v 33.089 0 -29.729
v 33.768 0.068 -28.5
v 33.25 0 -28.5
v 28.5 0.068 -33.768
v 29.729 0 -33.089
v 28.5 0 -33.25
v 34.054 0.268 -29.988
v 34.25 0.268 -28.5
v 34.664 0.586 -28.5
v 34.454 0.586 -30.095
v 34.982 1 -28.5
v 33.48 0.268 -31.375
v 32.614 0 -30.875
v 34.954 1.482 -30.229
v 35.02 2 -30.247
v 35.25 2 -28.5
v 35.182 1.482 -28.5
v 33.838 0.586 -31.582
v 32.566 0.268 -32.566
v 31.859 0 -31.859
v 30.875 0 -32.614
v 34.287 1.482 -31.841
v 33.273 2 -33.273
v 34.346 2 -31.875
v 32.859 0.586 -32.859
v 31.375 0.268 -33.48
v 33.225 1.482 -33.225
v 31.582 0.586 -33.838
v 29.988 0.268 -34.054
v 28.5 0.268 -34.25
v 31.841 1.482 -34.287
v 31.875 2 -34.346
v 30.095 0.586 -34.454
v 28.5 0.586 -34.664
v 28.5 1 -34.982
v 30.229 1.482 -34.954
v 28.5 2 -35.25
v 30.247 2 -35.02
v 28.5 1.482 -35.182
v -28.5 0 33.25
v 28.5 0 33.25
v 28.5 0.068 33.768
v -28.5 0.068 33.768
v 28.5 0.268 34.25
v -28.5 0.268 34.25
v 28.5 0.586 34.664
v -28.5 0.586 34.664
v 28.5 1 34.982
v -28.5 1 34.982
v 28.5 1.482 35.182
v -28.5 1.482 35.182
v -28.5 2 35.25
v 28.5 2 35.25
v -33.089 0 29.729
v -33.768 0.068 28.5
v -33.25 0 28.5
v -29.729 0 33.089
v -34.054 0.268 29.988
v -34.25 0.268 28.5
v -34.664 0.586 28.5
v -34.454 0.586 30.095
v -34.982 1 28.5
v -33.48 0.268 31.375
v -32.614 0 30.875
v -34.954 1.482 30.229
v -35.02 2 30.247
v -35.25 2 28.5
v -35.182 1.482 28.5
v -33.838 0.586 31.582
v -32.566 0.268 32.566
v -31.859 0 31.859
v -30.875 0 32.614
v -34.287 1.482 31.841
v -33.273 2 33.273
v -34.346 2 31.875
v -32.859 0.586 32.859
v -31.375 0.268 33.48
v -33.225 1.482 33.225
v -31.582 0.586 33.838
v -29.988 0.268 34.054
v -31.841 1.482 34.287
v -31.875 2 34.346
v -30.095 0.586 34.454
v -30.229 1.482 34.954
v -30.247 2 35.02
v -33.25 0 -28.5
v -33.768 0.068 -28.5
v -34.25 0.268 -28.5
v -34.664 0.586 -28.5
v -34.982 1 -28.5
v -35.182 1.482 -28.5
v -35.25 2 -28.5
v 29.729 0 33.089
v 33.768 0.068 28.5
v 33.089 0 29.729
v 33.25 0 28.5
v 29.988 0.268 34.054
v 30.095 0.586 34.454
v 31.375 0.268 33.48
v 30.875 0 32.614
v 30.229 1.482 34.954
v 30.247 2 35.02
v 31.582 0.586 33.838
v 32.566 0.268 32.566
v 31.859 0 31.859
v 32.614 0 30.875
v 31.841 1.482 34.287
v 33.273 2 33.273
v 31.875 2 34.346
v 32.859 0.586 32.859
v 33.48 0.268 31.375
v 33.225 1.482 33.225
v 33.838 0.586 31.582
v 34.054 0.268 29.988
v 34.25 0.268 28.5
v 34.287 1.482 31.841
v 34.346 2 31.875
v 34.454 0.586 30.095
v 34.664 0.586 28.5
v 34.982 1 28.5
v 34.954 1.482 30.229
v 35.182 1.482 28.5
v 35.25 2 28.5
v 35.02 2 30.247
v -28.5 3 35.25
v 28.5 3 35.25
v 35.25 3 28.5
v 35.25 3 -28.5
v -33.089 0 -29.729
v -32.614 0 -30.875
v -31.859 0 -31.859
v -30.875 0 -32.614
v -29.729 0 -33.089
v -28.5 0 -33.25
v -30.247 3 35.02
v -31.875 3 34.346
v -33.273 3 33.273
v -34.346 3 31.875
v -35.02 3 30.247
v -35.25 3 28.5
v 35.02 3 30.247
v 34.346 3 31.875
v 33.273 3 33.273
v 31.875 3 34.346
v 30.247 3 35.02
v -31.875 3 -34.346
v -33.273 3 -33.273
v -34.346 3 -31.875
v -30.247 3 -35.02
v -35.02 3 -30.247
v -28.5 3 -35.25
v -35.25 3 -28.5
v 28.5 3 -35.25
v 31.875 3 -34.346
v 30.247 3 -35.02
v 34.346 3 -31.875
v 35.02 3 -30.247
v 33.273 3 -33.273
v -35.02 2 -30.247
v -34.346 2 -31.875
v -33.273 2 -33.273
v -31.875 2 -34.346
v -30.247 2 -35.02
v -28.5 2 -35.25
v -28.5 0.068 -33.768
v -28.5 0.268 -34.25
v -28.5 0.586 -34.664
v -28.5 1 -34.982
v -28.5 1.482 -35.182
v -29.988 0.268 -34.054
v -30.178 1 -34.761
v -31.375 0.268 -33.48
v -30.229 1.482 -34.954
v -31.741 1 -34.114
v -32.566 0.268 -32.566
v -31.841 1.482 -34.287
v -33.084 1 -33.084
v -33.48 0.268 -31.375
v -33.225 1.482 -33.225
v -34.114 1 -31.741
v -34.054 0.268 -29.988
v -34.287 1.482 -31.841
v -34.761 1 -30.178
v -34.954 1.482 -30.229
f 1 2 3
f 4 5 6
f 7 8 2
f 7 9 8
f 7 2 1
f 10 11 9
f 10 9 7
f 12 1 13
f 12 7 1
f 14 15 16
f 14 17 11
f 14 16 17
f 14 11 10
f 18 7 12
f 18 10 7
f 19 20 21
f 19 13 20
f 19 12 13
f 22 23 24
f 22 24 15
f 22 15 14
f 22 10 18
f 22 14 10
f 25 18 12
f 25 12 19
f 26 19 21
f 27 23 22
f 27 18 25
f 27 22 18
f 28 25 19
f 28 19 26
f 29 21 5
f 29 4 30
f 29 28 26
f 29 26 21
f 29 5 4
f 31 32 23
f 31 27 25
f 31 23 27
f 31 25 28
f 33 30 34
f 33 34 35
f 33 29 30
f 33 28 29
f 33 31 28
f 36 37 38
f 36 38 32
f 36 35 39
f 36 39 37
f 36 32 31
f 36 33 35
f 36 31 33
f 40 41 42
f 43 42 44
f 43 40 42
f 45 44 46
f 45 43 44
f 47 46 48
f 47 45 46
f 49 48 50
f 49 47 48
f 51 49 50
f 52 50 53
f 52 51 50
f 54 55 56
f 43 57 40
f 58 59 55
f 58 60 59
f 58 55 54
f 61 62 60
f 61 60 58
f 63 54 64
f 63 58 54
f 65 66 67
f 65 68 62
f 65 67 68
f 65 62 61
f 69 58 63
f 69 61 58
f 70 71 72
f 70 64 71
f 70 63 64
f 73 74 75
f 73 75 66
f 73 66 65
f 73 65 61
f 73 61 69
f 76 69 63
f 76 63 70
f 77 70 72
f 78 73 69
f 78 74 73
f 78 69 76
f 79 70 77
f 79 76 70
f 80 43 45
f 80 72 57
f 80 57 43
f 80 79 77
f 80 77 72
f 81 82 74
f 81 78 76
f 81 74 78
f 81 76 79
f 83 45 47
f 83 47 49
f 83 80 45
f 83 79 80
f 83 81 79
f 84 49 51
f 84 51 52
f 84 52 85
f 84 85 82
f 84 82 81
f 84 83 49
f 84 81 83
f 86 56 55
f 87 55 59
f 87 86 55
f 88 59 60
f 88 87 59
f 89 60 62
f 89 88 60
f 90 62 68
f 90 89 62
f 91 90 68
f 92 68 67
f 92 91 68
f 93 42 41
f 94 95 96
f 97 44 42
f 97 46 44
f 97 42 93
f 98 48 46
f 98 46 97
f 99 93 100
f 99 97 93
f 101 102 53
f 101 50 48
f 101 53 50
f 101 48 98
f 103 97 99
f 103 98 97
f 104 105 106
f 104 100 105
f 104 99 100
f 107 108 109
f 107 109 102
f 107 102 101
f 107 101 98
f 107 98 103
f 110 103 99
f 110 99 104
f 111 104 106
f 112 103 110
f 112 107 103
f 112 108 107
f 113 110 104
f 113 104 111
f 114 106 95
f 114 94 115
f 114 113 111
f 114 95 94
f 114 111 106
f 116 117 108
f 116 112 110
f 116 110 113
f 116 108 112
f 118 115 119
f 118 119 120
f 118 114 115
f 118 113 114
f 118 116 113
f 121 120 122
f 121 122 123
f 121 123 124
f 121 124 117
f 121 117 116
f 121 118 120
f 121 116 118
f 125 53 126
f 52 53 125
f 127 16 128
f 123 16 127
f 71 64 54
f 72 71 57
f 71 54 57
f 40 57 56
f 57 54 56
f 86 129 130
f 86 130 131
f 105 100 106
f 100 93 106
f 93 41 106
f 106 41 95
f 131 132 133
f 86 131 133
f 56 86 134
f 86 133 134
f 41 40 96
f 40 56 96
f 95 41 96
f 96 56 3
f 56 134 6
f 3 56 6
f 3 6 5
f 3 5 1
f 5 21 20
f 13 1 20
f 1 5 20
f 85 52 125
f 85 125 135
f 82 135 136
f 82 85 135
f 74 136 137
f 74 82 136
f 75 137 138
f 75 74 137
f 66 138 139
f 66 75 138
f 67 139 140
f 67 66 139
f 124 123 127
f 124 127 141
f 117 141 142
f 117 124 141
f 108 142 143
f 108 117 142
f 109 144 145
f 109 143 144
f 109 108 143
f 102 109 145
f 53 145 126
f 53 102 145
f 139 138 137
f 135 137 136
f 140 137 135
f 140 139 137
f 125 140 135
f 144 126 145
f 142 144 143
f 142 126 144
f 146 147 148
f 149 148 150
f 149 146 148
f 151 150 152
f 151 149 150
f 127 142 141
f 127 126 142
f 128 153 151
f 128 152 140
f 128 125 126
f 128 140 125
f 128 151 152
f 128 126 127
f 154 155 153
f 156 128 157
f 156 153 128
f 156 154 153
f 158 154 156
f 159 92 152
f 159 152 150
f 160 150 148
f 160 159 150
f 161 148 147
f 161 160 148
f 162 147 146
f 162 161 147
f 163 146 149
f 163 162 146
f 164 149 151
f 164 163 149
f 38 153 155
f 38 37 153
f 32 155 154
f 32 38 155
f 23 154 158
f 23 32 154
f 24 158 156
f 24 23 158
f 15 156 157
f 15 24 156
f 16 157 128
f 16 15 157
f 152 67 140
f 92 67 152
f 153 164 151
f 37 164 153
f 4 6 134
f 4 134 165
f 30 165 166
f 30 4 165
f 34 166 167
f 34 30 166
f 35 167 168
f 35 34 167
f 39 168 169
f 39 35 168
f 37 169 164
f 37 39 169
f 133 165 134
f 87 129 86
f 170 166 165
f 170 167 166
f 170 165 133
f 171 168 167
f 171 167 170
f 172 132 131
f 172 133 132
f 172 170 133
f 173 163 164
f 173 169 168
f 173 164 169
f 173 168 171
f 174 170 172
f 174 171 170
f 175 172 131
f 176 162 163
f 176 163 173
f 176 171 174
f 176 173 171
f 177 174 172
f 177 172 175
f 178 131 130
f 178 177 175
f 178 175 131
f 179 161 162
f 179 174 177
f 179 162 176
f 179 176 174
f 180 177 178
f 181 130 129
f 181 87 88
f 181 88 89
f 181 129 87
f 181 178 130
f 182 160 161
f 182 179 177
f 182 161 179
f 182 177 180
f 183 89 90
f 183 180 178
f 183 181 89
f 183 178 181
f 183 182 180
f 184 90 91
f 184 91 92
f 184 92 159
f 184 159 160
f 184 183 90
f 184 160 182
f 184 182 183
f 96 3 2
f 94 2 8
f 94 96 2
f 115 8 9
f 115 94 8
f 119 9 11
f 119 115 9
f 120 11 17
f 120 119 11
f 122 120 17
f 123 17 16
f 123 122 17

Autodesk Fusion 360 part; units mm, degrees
sketch "Sketch1" plane through (0, 0, 0) normal (0, 1, 0) x (1, 0, 0)
  line L0 (35.25, -35.25) -> (-35.25, -35.25)
  line L1 (-35.25, -35.25) -> (-35.25, 35.25)
  line L2 (-35.25, 35.25) -> (35.25, 35.25)
  line L3 (35.25, 35.25) -> (35.25, -35.25)
  line L4 (35.25, -35.25) -> (-35.25, 35.25) construction
  line L5 (-35.25, -35.25) -> (35.25, 35.25) construction
  dimension "d1" = 70.5
  dimension "d2" = 70.5
extrude "Extrude1" add sketch "Sketch1" along normal blind 2
fillet "Fillet1" radius 6.75 4 edges at (-35.25, 1, 35.25) (-35.25, 1, -35.25) (35.25, 1, 35.25) (35.25, 1, -35.25)
fillet "Fillet2" radius 2 8 edges at (0, 0, -35.25) (-33.273, 0, -33.273) (-35.25, 0, 0) (-33.273, 0, 33.273) (0, 0, 35.25) (33.273, 0, 33.273) (35.25, 0, 0) (33.273, 0, -33.273)
extrude "Extrude2" add 1 faces at (9.5, 2, 11.75) along direction (0, 1, 0) blind 1
